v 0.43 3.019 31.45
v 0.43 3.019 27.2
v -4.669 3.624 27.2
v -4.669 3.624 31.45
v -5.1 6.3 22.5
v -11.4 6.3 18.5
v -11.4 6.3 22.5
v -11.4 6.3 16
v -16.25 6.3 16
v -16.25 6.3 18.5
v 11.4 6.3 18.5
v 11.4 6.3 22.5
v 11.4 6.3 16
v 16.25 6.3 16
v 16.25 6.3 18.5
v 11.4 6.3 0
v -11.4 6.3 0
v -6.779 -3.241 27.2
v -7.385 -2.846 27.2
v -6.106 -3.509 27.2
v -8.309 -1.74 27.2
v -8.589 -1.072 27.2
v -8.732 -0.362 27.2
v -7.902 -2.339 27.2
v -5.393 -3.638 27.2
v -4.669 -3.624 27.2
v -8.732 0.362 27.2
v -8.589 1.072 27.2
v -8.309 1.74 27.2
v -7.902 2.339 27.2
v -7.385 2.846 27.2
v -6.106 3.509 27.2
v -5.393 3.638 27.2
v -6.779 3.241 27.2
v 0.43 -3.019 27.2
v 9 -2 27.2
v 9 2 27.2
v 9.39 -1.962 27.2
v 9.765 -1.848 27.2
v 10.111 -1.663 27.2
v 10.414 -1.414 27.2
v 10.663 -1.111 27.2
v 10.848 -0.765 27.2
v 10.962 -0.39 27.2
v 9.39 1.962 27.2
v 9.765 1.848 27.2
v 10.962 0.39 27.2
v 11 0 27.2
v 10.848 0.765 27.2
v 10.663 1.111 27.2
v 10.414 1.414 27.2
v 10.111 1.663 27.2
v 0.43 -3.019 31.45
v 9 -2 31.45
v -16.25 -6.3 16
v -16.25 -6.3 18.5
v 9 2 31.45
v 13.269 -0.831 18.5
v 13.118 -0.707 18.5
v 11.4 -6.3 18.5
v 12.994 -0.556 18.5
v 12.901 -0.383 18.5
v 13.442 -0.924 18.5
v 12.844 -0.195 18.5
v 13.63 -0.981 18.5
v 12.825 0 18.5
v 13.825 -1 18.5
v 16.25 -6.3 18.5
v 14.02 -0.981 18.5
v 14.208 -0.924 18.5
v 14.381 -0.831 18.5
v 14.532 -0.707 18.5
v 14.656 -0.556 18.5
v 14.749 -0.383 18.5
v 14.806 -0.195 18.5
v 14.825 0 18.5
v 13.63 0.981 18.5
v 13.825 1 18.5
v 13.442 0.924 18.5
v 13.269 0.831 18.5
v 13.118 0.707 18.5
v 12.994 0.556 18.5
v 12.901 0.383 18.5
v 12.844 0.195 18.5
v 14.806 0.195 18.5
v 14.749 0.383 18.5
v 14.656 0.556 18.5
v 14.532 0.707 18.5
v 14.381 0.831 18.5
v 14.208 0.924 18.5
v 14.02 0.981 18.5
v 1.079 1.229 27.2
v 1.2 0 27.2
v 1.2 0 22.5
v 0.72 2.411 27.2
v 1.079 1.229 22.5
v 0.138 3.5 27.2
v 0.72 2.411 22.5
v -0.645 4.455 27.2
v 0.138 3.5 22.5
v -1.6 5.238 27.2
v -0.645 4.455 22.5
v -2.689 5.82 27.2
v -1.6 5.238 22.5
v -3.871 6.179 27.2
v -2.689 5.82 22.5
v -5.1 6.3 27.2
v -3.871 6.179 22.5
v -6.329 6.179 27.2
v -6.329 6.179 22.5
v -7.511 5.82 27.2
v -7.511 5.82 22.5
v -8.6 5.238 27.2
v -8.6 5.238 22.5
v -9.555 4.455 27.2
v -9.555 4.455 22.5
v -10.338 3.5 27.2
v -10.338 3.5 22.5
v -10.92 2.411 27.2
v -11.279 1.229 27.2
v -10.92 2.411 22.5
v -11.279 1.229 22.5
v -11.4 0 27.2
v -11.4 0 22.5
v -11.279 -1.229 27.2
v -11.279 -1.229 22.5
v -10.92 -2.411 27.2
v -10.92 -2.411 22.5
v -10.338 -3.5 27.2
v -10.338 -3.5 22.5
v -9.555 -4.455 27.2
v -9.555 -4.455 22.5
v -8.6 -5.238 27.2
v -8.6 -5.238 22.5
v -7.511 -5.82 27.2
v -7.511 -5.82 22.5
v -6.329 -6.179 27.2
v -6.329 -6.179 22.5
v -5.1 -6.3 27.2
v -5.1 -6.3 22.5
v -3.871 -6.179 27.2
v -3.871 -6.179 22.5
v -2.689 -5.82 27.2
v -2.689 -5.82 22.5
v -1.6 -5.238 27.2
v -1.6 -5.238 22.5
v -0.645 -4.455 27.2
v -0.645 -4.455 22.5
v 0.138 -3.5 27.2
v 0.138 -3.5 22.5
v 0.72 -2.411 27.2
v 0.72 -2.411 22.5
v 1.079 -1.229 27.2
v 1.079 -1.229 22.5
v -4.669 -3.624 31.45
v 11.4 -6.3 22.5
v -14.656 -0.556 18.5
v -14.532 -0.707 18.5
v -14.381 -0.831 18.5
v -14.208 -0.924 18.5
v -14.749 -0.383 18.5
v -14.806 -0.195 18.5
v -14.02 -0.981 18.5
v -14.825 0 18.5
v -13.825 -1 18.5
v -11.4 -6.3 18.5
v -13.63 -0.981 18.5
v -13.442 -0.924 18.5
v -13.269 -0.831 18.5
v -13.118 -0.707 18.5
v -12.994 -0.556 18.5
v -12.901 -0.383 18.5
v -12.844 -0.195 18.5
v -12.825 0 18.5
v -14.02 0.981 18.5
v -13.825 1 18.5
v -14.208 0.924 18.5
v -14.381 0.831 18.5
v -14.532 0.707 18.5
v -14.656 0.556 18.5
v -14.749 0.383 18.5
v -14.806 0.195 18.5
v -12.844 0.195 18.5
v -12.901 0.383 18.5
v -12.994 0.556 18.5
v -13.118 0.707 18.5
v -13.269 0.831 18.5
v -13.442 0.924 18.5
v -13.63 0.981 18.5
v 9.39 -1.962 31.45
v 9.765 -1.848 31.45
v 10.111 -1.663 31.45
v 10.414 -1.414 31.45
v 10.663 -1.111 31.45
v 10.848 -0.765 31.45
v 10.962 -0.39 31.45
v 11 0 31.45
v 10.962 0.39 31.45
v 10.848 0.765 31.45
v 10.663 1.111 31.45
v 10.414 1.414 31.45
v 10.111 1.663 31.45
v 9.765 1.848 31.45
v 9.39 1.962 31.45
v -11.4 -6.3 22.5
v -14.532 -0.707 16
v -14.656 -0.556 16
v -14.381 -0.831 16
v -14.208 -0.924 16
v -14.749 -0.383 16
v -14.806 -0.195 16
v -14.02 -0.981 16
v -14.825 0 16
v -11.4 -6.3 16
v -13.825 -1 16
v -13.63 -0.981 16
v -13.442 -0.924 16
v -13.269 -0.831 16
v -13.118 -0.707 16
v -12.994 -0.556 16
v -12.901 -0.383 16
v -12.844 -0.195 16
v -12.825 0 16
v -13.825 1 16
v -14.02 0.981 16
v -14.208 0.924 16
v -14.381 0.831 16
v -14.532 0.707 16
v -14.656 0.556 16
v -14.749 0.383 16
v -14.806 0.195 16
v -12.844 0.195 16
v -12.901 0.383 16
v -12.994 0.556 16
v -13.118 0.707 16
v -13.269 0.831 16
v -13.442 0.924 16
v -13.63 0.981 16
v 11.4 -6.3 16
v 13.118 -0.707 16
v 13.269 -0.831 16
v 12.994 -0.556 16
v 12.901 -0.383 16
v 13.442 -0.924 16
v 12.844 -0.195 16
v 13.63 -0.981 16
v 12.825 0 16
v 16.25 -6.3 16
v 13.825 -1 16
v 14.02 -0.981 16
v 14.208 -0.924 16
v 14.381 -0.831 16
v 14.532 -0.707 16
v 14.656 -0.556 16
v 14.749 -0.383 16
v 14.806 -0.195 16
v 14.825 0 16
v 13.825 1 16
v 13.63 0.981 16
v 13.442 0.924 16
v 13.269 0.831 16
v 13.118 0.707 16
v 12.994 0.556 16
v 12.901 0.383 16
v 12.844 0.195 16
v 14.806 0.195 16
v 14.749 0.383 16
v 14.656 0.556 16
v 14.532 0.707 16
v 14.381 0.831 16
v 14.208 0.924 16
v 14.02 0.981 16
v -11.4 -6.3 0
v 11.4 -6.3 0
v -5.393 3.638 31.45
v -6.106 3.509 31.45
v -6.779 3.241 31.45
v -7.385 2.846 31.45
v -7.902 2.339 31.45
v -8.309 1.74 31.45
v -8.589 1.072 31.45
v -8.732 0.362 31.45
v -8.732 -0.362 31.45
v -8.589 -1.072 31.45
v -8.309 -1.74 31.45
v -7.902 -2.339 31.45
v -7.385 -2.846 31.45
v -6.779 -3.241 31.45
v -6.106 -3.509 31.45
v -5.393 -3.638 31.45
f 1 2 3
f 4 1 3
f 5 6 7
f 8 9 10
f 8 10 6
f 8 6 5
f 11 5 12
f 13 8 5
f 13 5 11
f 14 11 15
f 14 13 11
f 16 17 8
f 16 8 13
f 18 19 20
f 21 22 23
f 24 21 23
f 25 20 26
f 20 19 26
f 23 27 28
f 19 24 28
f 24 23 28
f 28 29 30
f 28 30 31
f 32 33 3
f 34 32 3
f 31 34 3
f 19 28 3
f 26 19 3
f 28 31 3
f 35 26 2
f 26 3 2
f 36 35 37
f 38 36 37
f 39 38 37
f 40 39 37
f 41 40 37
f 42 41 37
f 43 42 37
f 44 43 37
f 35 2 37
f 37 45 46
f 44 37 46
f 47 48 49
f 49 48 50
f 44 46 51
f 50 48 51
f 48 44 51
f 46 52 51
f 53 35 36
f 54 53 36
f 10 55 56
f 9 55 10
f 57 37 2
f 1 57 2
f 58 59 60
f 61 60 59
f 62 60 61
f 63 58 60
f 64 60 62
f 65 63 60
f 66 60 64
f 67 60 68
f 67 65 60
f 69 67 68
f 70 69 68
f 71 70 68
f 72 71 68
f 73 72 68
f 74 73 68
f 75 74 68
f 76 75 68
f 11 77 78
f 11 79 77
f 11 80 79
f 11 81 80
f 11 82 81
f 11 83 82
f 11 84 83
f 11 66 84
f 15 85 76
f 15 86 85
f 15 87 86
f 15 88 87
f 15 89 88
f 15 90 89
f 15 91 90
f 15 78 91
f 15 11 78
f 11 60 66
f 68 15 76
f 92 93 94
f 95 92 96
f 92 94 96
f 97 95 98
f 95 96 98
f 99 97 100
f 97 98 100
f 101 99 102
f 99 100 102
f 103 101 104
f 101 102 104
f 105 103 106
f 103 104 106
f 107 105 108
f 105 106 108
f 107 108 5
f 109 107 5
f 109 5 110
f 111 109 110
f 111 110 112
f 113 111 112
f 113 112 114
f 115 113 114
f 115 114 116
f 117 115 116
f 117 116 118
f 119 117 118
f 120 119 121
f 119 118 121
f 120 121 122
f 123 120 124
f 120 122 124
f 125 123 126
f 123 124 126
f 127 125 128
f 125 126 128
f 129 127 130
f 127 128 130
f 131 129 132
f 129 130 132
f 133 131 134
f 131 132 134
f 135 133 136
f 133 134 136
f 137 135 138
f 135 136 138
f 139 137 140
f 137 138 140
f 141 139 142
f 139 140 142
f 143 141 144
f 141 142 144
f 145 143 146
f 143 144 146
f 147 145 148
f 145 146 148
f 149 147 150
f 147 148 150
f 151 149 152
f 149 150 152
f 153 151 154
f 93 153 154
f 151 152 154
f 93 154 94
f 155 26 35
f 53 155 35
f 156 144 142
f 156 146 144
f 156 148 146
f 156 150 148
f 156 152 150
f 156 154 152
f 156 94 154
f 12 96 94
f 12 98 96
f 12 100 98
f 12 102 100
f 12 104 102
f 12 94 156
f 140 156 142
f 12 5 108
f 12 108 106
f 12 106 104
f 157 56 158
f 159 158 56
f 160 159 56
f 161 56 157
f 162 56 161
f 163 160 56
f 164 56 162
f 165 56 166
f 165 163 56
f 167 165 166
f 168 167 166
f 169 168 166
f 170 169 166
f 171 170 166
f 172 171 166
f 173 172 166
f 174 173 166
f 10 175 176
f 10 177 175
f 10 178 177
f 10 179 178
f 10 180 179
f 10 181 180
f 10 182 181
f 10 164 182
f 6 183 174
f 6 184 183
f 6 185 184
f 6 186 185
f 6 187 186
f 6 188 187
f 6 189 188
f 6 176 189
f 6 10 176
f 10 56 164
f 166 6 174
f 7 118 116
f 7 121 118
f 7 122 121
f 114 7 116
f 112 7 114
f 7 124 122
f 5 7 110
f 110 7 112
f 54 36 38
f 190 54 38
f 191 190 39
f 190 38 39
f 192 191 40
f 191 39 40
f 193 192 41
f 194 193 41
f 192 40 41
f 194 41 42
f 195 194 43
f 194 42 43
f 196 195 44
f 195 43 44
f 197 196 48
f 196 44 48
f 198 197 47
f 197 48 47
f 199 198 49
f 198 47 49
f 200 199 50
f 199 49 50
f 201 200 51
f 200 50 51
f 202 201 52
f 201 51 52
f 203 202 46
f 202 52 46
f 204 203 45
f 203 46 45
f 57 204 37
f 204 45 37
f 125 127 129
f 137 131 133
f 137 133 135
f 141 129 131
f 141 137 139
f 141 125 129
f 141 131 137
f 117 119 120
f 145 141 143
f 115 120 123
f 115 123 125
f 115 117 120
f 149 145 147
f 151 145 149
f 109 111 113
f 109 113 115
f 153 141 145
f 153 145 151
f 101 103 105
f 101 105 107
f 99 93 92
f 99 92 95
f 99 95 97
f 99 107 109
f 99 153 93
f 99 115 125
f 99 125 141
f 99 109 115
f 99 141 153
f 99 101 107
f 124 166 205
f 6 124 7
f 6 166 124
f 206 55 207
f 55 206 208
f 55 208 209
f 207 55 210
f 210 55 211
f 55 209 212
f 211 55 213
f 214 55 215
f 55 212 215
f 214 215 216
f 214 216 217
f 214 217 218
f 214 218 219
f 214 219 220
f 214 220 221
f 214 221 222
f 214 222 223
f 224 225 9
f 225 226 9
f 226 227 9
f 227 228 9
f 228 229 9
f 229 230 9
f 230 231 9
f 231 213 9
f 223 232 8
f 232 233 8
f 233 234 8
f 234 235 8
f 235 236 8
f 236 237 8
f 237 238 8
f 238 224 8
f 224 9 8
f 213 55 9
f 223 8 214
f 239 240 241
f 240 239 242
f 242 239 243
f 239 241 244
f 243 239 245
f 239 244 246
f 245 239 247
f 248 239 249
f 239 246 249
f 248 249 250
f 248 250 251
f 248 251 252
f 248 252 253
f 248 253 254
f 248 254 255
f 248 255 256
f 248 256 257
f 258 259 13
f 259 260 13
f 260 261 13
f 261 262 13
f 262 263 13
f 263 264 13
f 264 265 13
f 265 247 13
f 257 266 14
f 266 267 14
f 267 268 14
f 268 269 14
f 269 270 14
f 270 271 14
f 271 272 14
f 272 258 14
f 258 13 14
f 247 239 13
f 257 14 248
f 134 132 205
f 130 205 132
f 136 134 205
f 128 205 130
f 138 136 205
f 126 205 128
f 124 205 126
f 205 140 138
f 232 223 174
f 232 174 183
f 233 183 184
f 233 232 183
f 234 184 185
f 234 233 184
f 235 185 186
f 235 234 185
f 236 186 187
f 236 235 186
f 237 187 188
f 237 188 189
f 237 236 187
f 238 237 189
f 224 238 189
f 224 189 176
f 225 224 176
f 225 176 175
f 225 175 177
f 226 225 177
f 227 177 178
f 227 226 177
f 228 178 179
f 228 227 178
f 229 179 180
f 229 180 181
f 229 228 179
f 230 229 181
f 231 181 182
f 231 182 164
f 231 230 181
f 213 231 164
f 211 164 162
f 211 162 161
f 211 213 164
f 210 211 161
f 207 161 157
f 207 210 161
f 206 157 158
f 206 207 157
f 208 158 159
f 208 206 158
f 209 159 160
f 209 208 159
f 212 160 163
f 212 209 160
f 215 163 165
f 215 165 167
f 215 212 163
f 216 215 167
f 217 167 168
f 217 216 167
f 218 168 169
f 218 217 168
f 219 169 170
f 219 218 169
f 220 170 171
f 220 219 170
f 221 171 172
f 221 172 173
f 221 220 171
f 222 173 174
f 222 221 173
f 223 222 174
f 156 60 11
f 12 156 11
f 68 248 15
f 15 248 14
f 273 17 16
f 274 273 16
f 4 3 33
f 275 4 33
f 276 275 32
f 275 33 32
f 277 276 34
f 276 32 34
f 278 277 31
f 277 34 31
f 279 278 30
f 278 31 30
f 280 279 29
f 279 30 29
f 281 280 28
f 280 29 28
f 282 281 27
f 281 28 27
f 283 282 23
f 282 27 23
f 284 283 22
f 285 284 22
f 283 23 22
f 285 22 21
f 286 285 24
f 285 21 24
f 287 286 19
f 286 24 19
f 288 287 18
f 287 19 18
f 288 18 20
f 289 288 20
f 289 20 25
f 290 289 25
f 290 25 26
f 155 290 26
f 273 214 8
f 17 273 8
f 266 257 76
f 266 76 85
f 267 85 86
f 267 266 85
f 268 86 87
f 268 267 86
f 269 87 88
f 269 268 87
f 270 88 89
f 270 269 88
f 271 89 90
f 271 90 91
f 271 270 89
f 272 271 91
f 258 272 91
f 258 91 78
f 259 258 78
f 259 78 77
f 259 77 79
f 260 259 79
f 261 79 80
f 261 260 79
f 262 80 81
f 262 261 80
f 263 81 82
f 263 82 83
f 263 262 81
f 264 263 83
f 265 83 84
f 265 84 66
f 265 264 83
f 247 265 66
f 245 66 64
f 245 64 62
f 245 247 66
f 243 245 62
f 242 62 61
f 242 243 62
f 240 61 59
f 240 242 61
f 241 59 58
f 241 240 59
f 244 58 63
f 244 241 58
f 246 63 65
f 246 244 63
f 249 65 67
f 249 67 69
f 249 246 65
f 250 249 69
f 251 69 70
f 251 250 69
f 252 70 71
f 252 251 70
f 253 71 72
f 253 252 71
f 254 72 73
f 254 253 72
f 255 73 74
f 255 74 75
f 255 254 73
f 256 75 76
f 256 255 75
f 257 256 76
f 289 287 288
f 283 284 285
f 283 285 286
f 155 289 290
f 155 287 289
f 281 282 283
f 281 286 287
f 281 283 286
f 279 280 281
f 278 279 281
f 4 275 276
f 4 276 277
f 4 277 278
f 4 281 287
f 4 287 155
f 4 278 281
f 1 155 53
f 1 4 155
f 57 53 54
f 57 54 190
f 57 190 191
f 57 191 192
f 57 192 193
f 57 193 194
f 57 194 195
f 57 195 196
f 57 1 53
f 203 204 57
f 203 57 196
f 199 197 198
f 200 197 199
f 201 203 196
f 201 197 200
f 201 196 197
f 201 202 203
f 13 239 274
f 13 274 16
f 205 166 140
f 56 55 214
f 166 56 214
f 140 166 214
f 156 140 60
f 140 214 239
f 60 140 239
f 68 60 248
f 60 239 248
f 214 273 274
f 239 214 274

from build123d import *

# Parameters (mm, degrees)
F1_W      = 22.8
F1_H      = 12.6
F2_DEPTH  = 16
F4_W      = 32.5
F4_H      = 12.6
F4_R      = 1
F5_DEPTH  = 2.5
F7_W      = 22.8
F7_H      = 12.6
F8_DEPTH  = 4
F10_R     = 6.3
F11_DEPTH = 4.7
F14_DEPTH = 4.25


with BuildPart() as f2:
    # F1 (on Top) → F2 (new body)
    with BuildSketch(Plane.XY):
        Rectangle(F1_W, F1_H)
    extrude(amount=F2_DEPTH)

    # F4 (on face) → F5 (join)
    with BuildSketch(Plane.XY.offset(16)):
        Rectangle(F4_W, F4_H)
        with Locations((-13.825, 0)):
            Circle(F4_R, mode=Mode.SUBTRACT)
        with Locations((13.825, 0)):
            Circle(F4_R, mode=Mode.SUBTRACT)
    extrude(amount=F5_DEPTH)

    # F7 (on face) → F8 (join)
    with BuildSketch(Plane.XY.offset(18.5)):
        Rectangle(F7_W, F7_H)
    extrude(amount=F8_DEPTH)

    # F10 (on face) → F11 (join)
    with BuildSketch(Plane.XY.offset(22.5)):
        with Locations((-5.1, 0)):
            Circle(F10_R)
    extrude(amount=F11_DEPTH)


with BuildPart() as f14:
    # F13 (on face) → F14 (new body)
    with BuildSketch(Plane.XY.offset(27.2)):
        with BuildLine():
            Line((0.4297926038, 3.0185085321), (-4.6692544986, 3.6244942148))
            ThreePointArc((-4.6692544986, 3.6244942148), (-8.75, 0), (-4.6692544986, -3.6244942148))
            Line((-4.6692544986, -3.6244942148), (0.4297926038, -3.0185085321))
            ThreePointArc((0.4297926038, -3.0185085321), (1.0044120685, -1.5576114079), (1.2, 0))
            ThreePointArc((1.2, 0), (1.0044120685, 1.5576114079), (0.4297926038, 3.0185085321))
        make_face()
        with BuildLine():
            Line((9, 2), (0.4297926038, 3.0185085321))
            ThreePointArc((0.4297926038, 3.0185085321), (1.0044120685, 1.5576114079), (1.2, 0))
            ThreePointArc((1.2, 0), (1.0044120685, -1.5576114079), (0.4297926038, -3.0185085321))
            Line((0.4297926038, -3.0185085321), (9, -2))
            ThreePointArc((9, -2), (11, 0), (9, 2))
        make_face()
    extrude(amount=F14_DEPTH)


solid = Compound([f2.part, f14.part])
